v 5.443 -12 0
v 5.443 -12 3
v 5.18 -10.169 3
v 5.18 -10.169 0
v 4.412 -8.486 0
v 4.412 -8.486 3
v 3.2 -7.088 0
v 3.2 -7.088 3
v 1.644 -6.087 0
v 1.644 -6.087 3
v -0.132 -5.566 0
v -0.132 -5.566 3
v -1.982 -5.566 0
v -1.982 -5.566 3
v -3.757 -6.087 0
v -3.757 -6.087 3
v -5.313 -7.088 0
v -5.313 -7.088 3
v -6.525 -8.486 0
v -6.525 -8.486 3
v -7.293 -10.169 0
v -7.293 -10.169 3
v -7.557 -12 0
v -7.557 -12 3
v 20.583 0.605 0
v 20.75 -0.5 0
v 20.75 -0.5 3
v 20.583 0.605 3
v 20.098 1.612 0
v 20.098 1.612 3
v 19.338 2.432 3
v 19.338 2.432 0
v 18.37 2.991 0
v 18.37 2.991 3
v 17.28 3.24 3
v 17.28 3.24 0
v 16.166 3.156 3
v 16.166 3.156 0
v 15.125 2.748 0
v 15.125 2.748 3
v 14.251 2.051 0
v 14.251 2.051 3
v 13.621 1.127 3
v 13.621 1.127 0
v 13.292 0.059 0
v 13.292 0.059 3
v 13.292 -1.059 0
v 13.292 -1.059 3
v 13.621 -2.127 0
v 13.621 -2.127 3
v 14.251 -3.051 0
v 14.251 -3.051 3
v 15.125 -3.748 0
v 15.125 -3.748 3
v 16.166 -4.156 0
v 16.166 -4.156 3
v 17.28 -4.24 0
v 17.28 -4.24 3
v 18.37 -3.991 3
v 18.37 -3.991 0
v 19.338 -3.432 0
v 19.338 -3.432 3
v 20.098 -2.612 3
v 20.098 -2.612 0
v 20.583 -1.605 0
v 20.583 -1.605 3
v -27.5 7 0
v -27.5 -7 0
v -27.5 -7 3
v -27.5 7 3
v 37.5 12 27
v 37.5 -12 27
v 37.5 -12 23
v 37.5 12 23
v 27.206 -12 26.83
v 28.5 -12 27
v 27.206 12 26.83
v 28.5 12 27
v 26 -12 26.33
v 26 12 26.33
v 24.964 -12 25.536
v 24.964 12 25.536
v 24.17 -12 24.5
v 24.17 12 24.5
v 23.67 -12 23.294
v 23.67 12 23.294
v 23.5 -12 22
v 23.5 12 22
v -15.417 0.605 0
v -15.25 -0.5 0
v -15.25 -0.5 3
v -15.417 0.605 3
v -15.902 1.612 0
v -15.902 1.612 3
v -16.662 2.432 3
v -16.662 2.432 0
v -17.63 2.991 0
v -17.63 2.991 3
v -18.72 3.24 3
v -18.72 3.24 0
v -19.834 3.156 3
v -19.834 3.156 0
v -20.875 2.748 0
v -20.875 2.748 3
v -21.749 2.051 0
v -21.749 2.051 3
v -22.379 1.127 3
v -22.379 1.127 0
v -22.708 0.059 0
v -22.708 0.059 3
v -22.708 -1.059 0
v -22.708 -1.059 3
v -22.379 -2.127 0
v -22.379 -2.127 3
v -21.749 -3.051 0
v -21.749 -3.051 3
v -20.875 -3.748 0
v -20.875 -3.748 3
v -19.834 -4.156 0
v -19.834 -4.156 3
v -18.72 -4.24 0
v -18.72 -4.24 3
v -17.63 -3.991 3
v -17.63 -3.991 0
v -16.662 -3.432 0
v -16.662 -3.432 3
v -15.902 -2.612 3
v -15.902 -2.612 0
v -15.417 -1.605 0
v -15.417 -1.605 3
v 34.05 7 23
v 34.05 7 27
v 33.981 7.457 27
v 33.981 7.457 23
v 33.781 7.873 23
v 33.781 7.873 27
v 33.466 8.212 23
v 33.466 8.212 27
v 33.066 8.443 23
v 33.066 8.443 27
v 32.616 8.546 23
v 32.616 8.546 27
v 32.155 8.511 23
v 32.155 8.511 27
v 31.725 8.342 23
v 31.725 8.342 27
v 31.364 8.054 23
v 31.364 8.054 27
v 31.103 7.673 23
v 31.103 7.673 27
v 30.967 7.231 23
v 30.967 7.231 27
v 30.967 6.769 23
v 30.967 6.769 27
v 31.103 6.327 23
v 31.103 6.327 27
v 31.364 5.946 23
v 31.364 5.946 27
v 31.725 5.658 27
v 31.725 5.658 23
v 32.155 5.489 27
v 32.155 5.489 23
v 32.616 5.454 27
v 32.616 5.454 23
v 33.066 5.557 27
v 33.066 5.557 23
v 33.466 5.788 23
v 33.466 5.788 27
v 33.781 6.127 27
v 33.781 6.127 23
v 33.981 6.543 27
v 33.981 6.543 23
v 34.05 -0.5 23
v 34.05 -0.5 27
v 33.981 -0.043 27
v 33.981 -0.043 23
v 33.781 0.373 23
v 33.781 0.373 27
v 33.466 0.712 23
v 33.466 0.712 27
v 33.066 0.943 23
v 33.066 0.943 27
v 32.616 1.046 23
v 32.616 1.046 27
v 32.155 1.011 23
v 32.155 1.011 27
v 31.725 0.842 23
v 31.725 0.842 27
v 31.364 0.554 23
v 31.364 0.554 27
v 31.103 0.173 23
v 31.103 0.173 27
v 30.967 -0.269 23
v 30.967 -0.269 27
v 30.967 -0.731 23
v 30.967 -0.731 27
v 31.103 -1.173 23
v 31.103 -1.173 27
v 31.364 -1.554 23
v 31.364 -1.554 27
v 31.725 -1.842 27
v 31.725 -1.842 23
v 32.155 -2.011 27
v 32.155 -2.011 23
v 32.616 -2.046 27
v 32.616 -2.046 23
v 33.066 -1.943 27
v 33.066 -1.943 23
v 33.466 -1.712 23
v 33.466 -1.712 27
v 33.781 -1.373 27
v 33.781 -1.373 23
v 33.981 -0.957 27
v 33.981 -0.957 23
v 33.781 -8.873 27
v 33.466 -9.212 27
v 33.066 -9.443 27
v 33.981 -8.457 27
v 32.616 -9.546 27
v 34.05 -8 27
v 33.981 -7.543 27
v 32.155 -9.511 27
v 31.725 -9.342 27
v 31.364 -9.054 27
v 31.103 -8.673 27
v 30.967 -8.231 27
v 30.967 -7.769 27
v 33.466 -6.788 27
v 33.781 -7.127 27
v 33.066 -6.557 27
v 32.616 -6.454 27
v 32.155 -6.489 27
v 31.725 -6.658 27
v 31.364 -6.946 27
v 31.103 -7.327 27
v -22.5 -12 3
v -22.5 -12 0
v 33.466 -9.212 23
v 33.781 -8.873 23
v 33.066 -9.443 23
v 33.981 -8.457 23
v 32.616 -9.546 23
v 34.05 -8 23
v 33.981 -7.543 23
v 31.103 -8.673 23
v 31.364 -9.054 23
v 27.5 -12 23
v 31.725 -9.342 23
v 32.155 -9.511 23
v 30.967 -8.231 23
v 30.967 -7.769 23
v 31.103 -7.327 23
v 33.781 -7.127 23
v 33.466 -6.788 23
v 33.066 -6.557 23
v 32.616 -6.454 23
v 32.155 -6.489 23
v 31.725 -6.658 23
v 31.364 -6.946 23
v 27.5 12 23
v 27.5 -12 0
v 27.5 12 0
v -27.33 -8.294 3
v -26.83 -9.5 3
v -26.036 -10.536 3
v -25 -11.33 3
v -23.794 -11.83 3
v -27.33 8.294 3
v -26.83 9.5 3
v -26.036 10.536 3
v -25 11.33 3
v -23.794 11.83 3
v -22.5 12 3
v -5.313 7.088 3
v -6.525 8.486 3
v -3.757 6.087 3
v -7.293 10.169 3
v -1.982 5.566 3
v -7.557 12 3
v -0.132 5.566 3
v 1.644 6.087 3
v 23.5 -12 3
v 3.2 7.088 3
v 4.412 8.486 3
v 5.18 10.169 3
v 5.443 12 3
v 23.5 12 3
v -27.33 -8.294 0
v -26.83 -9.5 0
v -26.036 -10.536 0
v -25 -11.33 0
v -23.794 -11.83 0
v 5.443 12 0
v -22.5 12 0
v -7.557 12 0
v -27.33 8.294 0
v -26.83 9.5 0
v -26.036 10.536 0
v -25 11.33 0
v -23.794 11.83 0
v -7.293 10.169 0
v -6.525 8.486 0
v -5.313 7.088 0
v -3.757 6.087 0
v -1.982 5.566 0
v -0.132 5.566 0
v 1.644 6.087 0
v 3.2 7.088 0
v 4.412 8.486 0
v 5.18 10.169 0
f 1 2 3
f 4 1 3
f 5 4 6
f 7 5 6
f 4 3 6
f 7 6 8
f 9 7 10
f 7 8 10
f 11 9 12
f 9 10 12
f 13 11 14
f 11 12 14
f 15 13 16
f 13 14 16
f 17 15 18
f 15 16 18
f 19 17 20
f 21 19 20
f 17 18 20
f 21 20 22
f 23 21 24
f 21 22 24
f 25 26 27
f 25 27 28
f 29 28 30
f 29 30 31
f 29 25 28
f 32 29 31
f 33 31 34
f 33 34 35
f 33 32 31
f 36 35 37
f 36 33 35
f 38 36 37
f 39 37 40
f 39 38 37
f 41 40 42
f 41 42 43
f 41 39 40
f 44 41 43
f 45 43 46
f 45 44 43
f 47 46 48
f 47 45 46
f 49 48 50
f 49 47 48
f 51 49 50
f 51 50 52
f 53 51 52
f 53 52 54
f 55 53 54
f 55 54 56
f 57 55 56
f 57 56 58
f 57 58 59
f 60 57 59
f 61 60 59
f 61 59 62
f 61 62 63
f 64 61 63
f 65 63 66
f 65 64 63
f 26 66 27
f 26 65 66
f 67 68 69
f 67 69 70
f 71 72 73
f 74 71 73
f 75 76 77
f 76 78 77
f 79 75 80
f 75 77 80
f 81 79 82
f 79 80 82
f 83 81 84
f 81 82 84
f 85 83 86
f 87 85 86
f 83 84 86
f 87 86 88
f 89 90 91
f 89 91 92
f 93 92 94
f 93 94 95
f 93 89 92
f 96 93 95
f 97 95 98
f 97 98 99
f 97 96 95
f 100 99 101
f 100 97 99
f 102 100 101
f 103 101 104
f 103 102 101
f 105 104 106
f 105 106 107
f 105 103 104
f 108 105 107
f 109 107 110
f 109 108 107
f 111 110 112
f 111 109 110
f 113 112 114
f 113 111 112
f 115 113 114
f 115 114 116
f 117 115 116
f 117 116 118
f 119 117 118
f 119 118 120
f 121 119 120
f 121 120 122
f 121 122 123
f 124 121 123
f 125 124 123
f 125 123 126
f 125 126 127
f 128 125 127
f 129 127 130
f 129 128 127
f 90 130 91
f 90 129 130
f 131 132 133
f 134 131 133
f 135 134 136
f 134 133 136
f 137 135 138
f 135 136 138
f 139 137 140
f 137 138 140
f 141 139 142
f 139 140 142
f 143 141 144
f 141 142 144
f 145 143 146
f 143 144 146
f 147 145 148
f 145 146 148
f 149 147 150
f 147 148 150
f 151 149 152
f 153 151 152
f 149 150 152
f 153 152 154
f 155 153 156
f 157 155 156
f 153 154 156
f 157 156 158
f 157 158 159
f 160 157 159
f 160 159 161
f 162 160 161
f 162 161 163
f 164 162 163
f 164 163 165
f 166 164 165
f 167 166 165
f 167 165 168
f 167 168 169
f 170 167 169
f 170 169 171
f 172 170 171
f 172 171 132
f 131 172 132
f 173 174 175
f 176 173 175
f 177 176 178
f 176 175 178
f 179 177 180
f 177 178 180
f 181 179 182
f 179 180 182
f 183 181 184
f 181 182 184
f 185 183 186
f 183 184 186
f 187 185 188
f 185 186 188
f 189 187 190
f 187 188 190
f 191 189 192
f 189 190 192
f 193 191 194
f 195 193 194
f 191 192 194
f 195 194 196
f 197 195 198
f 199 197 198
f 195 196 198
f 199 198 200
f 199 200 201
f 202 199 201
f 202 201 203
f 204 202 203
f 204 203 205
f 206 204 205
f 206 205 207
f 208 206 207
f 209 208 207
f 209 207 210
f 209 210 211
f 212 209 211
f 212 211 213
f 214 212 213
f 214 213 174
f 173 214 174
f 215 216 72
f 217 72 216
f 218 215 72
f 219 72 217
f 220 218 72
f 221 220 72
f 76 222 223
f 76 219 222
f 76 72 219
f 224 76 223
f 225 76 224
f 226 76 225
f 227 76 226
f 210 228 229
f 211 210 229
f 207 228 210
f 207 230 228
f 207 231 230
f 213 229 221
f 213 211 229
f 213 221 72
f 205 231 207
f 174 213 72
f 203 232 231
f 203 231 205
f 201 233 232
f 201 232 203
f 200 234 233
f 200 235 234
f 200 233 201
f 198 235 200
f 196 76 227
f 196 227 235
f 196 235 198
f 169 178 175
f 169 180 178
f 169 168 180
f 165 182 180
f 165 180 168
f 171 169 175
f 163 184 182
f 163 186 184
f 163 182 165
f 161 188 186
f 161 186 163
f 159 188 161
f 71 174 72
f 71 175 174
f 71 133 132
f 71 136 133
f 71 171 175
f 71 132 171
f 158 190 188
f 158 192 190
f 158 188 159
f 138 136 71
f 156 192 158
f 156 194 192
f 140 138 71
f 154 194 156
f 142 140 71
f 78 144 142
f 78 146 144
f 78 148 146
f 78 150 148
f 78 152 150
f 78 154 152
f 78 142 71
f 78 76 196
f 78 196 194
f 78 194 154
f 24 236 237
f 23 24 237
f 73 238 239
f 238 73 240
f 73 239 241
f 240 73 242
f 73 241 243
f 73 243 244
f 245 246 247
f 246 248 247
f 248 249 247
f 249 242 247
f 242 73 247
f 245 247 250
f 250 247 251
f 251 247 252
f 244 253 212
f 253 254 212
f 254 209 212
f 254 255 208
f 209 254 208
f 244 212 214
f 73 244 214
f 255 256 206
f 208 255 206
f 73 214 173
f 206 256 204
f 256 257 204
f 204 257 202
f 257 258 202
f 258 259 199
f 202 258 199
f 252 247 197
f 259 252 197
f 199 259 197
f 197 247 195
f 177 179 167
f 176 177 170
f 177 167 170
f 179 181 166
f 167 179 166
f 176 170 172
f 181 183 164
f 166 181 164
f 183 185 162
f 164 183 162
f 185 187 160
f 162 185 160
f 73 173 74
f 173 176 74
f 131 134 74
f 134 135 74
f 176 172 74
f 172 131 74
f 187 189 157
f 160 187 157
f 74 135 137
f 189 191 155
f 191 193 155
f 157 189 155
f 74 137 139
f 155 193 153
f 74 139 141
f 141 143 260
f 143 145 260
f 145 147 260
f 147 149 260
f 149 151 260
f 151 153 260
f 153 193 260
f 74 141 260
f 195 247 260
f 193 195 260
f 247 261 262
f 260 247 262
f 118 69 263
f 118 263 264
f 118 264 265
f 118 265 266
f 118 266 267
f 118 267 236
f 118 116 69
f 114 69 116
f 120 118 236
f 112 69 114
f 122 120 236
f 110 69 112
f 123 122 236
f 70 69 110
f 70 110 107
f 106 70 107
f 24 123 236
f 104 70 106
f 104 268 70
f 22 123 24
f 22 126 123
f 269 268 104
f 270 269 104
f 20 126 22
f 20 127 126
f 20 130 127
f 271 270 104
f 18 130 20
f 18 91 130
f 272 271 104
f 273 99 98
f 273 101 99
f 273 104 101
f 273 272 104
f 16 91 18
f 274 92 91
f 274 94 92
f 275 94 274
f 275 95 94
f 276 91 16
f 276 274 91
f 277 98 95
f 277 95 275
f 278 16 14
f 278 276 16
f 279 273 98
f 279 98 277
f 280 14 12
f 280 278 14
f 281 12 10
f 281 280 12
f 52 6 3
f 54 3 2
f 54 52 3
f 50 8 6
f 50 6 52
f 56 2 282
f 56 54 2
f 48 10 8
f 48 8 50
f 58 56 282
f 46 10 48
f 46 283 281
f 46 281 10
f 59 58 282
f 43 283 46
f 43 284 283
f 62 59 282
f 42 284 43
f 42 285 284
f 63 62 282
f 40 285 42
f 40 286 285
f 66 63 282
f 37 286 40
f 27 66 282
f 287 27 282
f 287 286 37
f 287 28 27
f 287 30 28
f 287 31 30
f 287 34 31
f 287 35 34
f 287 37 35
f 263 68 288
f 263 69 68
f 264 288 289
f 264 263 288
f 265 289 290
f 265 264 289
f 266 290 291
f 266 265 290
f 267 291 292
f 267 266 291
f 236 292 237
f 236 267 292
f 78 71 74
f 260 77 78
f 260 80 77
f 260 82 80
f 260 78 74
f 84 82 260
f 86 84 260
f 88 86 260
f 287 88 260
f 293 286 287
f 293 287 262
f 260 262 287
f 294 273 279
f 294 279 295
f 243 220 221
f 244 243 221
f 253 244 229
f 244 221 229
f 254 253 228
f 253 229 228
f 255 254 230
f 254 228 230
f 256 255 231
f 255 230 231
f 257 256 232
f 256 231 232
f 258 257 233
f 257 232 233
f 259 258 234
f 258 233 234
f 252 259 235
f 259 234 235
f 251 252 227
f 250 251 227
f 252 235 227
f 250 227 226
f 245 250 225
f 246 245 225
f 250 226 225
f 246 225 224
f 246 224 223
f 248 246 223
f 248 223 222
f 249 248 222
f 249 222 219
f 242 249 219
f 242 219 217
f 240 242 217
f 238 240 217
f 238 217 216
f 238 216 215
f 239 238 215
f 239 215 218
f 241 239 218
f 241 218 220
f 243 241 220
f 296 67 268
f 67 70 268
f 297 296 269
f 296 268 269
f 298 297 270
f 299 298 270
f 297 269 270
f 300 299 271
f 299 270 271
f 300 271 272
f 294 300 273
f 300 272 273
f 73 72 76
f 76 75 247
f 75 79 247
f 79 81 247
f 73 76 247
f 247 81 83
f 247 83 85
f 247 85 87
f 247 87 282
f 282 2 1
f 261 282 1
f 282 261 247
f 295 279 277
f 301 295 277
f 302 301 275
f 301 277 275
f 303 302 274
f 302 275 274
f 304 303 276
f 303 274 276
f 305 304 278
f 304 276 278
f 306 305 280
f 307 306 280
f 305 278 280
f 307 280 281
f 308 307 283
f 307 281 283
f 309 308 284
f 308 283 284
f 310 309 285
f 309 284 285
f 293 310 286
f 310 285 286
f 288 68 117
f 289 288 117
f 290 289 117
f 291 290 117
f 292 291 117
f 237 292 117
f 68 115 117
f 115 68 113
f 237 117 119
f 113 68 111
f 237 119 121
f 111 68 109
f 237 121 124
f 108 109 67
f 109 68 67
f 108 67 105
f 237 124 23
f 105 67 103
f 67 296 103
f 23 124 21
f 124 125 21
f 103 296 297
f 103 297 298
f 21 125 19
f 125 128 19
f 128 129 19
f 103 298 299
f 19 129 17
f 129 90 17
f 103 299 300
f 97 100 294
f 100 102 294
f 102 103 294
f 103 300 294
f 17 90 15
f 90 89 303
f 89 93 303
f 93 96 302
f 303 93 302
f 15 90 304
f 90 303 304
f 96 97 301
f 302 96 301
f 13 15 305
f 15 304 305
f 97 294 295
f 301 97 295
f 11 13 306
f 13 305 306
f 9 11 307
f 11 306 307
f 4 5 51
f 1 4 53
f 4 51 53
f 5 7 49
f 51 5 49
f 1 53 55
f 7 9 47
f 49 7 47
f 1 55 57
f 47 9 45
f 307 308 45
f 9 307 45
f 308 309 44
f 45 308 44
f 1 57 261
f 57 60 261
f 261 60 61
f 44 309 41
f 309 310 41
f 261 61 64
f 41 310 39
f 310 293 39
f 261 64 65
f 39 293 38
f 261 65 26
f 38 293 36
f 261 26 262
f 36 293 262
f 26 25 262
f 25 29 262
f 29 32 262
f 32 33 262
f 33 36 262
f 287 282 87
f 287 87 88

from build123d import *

# Parameters (mm, degrees)
SKETCH1_W           = 55
SKETCH1_H           = 24
SKETCH1_R           = 3.75
BOSS_EXTRUDE1_DEPTH = 3
SKETCH3_W           = 4
SKETCH3_H           = 24
BOSS_EXTRUDE2_DEPTH = 24
SKETCH4_W           = 4
SKETCH4_H           = 24
BOSS_EXTRUDE3_DEPTH = 10
SKETCH5_R           = 1.55
CUT_EXTRUDE1_DEPTH  = 10
CUT_EXTRUDE2_REACH  = 48.111
SKETCH6_R           = 6.5
FILLET1_R           = 5


with BuildPart() as part:
    # Sketch1 → Boss-Extrude1 (new body)
    with BuildSketch(Plane.XY):
        Rectangle(SKETCH1_W, SKETCH1_H)
        with Locations((-19, -0.5)):
            Circle(SKETCH1_R, mode=Mode.SUBTRACT)
        with Locations((17, -0.5)):
            Circle(SKETCH1_R, mode=Mode.SUBTRACT)
    extrude(amount=BOSS_EXTRUDE1_DEPTH)

    # Sketch3 → Boss-Extrude2 (add)
    with BuildSketch(Plane.XY.offset(3)):
        with Locations((25.5, 0)):
            Rectangle(SKETCH3_W, SKETCH3_H)
    extrude(amount=BOSS_EXTRUDE2_DEPTH)

    # Sketch4 → Boss-Extrude3 (add)
    with BuildSketch(Plane(origin=(27.5, 0, 0), x_dir=(0, 0, -1), z_dir=(1, 0, 0))):
        with Locations((-25, 0)):
            Rectangle(SKETCH4_W, SKETCH4_H)
    extrude(amount=BOSS_EXTRUDE3_DEPTH)

    # Sketch5 → Cut-Extrude1 (cut)
    with BuildSketch(Plane.XY.offset(27)):
        with Locations((32.5, 7)):
            Circle(SKETCH5_R)
        with Locations((32.5, -0.5)):
            Circle(SKETCH5_R)
        with Locations((32.5, -8)):
            Circle(SKETCH5_R)
    extrude(amount=-CUT_EXTRUDE1_DEPTH, mode=Mode.SUBTRACT)

    # Sketch6 → Cut-Extrude2 (cut, up to next)
    with BuildSketch(Plane.XY.offset(3), mode=Mode.PRIVATE) as cut_extrude2_sk1:
        with Locations((-1.056622026, 12)):
            Circle(SKETCH6_R)
    cut_extrude2_tool1 = extrude(cut_extrude2_sk1.sketch, amount=-CUT_EXTRUDE2_REACH, mode=Mode.PRIVATE) & part.part
    # Sketch6 → Cut-Extrude2 (cut, up to next)
    with BuildSketch(Plane.XY.offset(3), mode=Mode.PRIVATE) as cut_extrude2_sk2:
        with Locations((-1.056622026, -12)):
            Circle(SKETCH6_R)
    cut_extrude2_tool2 = extrude(cut_extrude2_sk2.sketch, amount=-CUT_EXTRUDE2_REACH, mode=Mode.PRIVATE) & part.part
    add(cut_extrude2_tool1.solids().sort_by_distance((-1.056622, 12, 3))[0], mode=Mode.SUBTRACT)
    add(cut_extrude2_tool2.solids().sort_by_distance((-1.056622, -12, 3))[0], mode=Mode.SUBTRACT)

    # Fillet1
    fillet1_edges = [part.edges().sort_by_distance(p)[0] for p in [
        (23.5, 0, 27),
        (-27.5, 12, 1.5),
        (-27.5, -12, 1.5),
    ]]
    fillet(fillet1_edges, radius=FILLET1_R)


solid = part.part
